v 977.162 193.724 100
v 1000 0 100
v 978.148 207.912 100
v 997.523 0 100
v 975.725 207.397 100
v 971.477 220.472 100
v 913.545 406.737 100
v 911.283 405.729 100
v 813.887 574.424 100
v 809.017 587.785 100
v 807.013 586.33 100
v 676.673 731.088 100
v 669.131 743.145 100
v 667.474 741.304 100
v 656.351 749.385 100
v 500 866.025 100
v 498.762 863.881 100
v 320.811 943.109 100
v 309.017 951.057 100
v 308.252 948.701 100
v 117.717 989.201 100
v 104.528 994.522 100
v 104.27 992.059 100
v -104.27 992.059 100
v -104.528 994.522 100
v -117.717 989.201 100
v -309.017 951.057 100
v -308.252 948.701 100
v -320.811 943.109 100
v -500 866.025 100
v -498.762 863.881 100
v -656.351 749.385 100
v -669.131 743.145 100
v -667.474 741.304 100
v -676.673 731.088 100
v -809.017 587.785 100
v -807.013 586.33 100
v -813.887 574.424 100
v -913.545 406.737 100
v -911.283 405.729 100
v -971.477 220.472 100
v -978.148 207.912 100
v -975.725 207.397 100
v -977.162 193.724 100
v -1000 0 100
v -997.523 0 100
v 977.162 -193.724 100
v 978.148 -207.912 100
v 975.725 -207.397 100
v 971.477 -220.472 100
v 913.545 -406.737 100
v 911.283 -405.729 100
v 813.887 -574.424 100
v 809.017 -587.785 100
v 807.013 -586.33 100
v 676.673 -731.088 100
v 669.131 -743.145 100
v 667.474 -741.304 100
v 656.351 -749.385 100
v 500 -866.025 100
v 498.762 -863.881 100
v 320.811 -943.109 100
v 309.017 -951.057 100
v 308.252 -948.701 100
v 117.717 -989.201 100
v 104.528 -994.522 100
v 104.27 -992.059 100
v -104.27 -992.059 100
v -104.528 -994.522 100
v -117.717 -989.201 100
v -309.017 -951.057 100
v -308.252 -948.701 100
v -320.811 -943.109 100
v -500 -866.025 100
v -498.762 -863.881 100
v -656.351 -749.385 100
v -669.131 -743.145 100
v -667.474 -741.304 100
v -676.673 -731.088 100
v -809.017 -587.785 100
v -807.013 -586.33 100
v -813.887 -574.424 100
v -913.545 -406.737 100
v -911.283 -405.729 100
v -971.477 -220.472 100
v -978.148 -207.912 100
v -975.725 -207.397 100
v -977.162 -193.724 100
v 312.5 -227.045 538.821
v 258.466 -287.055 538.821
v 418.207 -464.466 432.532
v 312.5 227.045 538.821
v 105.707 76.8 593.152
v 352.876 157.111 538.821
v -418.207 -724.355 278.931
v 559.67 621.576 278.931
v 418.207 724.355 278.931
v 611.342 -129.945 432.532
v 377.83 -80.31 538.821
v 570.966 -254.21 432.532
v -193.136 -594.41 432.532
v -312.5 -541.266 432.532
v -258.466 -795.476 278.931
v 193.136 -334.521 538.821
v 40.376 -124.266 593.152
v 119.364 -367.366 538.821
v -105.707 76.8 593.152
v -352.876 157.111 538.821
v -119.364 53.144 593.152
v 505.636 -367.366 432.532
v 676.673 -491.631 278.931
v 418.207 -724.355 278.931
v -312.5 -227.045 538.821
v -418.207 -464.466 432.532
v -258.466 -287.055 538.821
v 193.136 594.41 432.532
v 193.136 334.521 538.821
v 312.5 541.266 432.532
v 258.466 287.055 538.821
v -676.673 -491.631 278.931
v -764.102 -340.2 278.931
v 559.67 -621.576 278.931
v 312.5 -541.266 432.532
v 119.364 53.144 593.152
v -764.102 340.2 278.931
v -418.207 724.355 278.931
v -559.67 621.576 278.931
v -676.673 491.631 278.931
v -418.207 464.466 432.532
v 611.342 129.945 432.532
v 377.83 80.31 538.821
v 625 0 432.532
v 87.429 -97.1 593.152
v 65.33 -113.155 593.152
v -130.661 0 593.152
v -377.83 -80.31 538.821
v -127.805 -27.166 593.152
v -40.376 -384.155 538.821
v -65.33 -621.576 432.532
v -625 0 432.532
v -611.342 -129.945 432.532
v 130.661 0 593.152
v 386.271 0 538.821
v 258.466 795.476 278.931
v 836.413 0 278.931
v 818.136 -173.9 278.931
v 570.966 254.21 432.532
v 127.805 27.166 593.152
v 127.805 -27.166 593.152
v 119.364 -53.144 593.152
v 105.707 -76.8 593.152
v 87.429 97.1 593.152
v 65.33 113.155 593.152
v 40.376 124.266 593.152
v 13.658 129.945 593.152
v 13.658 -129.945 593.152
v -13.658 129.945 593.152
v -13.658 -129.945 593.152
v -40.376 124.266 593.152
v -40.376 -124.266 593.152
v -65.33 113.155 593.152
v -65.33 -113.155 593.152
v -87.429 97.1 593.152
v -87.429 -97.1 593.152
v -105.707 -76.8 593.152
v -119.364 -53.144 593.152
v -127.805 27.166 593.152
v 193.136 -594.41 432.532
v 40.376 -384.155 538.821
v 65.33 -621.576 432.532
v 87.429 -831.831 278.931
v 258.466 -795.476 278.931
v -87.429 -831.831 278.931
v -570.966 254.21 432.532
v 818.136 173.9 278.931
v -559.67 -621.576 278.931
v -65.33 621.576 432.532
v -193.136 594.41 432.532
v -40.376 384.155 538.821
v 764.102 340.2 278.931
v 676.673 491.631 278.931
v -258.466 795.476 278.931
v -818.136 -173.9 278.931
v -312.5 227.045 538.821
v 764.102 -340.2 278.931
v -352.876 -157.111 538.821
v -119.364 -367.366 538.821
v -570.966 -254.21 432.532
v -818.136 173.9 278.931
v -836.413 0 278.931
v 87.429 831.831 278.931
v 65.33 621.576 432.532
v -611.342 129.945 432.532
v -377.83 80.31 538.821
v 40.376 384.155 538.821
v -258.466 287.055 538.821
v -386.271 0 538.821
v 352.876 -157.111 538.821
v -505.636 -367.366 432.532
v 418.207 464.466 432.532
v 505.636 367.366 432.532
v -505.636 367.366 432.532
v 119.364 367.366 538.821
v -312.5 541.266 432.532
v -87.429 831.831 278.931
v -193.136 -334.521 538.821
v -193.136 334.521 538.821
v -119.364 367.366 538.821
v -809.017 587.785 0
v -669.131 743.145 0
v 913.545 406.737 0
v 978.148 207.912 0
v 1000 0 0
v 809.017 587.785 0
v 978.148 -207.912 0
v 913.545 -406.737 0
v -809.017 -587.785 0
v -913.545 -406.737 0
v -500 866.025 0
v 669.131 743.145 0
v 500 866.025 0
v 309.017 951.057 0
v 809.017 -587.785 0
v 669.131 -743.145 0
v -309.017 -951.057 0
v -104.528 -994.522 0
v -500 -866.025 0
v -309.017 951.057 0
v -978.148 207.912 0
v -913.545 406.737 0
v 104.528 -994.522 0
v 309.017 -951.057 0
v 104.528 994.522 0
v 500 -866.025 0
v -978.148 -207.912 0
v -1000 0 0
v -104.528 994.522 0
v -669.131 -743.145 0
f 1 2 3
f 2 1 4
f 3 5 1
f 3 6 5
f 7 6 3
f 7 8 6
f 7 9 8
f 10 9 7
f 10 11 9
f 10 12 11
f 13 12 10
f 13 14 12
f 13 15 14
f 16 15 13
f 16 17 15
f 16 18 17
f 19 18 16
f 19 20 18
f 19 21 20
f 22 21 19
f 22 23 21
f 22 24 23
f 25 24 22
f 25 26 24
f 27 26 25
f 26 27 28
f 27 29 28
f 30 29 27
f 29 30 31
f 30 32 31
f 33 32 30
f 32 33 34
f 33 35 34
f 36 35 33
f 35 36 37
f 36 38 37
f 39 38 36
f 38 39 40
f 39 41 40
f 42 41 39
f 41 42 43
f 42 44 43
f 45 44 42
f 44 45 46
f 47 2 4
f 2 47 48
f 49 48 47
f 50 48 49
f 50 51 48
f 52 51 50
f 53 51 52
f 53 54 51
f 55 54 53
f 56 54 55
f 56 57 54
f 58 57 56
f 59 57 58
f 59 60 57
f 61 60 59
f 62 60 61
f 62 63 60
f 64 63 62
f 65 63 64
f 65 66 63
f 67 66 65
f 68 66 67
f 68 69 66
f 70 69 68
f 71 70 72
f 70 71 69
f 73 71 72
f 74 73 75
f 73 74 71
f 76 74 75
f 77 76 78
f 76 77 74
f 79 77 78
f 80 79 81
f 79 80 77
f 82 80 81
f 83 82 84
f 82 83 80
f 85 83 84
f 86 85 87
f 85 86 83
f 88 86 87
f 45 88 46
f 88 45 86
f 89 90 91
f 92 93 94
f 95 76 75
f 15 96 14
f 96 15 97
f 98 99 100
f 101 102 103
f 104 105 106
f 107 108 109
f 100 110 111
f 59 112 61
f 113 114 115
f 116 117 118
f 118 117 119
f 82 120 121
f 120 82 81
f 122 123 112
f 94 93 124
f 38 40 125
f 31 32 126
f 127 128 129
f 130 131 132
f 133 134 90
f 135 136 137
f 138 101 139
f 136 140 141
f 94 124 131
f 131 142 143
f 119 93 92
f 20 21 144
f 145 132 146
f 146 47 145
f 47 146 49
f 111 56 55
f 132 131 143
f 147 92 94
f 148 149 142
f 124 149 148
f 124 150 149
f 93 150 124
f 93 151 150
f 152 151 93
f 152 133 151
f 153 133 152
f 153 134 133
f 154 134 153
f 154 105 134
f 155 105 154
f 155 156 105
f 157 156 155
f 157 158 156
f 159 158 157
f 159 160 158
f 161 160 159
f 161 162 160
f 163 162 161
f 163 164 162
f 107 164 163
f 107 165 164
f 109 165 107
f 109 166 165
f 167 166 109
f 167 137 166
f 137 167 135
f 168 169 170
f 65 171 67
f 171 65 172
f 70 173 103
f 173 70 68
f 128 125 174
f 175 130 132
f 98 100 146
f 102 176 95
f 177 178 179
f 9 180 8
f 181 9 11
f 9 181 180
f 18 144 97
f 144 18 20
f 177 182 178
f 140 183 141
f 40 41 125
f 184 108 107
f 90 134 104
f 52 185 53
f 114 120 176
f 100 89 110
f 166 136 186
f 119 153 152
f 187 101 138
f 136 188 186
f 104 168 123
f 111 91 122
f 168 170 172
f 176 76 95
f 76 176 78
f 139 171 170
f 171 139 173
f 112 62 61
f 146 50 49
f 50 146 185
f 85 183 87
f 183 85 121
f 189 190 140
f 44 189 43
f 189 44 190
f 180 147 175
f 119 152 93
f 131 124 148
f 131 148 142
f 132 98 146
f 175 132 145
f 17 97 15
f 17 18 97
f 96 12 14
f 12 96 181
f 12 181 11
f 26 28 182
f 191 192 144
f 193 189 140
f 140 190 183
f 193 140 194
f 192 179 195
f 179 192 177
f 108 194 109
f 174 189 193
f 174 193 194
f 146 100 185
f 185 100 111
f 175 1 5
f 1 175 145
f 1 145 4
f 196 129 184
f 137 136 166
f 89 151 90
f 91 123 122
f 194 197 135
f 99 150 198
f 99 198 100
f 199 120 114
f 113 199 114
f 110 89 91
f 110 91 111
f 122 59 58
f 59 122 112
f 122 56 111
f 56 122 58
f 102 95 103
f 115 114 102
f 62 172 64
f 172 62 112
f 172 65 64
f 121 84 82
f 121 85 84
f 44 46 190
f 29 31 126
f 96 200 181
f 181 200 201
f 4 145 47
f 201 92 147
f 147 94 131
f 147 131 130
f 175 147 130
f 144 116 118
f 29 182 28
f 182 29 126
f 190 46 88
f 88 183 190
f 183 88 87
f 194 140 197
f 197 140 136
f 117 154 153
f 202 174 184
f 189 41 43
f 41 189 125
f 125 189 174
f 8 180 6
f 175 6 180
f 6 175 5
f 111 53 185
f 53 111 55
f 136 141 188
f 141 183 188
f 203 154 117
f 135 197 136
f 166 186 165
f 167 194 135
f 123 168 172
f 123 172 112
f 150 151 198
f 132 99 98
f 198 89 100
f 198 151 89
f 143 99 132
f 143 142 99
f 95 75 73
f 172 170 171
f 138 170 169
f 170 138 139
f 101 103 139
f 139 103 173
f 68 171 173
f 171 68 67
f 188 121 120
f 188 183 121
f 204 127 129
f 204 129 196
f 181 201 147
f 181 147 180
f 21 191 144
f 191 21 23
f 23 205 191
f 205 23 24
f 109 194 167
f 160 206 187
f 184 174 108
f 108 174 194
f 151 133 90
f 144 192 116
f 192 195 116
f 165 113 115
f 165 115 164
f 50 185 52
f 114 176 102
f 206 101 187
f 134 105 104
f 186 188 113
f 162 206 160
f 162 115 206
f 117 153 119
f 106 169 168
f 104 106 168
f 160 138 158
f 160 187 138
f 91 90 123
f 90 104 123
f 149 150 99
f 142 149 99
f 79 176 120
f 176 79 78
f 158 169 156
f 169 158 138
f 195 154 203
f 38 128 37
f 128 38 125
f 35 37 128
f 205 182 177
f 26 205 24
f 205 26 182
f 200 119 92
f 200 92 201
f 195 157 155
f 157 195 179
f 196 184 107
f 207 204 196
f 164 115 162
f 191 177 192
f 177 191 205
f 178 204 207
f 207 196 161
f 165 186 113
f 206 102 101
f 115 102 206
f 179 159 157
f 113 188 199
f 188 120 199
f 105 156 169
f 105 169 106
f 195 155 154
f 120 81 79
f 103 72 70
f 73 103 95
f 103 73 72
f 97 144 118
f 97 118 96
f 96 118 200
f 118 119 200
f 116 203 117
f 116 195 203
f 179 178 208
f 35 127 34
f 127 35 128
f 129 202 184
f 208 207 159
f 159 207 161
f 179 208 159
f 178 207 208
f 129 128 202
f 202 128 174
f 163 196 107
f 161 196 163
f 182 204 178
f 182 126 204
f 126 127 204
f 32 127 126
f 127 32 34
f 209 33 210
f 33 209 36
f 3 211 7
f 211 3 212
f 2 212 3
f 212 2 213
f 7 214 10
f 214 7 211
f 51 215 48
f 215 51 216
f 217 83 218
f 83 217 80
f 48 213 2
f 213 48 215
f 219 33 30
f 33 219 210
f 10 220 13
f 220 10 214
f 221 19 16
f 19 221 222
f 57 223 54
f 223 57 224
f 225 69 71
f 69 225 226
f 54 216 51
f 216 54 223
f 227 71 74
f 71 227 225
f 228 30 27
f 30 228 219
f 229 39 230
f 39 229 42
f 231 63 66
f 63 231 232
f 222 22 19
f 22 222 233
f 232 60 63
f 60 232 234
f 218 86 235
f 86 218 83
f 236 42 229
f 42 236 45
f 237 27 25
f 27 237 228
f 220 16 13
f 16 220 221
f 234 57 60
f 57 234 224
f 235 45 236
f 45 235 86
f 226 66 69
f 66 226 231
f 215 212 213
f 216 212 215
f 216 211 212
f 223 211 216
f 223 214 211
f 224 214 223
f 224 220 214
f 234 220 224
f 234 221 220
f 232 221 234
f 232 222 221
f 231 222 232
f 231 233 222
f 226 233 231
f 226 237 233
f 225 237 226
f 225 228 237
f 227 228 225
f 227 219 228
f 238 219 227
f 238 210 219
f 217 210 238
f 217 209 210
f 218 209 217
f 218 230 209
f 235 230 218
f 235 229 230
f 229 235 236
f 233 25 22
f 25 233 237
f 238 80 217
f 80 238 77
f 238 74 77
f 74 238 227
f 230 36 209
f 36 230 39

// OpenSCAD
module make_dome(base=1000, factor=0.4) {
    radius = sqrt(pow(base,2)/(2*(1-factor)-pow(1-factor,2)));
    translate([0,0,-radius*factor])
    difference() {
        sphere(r=radius);
        translate([0,0,-radius*(1-factor)])
        cube(radius*2, center=true);
    }
}

outside_r = 1000;
factor = 0.6;

color([0.4,0.4,0.4], 1);
cylinder(h=100, r=outside_r);
translate([0,0,100]) make_dome(outside_r*0.96, factor);
color([0.7,0.7,1], 0.6);
translate([0,0,100]) make_dome(outside_r, factor);
